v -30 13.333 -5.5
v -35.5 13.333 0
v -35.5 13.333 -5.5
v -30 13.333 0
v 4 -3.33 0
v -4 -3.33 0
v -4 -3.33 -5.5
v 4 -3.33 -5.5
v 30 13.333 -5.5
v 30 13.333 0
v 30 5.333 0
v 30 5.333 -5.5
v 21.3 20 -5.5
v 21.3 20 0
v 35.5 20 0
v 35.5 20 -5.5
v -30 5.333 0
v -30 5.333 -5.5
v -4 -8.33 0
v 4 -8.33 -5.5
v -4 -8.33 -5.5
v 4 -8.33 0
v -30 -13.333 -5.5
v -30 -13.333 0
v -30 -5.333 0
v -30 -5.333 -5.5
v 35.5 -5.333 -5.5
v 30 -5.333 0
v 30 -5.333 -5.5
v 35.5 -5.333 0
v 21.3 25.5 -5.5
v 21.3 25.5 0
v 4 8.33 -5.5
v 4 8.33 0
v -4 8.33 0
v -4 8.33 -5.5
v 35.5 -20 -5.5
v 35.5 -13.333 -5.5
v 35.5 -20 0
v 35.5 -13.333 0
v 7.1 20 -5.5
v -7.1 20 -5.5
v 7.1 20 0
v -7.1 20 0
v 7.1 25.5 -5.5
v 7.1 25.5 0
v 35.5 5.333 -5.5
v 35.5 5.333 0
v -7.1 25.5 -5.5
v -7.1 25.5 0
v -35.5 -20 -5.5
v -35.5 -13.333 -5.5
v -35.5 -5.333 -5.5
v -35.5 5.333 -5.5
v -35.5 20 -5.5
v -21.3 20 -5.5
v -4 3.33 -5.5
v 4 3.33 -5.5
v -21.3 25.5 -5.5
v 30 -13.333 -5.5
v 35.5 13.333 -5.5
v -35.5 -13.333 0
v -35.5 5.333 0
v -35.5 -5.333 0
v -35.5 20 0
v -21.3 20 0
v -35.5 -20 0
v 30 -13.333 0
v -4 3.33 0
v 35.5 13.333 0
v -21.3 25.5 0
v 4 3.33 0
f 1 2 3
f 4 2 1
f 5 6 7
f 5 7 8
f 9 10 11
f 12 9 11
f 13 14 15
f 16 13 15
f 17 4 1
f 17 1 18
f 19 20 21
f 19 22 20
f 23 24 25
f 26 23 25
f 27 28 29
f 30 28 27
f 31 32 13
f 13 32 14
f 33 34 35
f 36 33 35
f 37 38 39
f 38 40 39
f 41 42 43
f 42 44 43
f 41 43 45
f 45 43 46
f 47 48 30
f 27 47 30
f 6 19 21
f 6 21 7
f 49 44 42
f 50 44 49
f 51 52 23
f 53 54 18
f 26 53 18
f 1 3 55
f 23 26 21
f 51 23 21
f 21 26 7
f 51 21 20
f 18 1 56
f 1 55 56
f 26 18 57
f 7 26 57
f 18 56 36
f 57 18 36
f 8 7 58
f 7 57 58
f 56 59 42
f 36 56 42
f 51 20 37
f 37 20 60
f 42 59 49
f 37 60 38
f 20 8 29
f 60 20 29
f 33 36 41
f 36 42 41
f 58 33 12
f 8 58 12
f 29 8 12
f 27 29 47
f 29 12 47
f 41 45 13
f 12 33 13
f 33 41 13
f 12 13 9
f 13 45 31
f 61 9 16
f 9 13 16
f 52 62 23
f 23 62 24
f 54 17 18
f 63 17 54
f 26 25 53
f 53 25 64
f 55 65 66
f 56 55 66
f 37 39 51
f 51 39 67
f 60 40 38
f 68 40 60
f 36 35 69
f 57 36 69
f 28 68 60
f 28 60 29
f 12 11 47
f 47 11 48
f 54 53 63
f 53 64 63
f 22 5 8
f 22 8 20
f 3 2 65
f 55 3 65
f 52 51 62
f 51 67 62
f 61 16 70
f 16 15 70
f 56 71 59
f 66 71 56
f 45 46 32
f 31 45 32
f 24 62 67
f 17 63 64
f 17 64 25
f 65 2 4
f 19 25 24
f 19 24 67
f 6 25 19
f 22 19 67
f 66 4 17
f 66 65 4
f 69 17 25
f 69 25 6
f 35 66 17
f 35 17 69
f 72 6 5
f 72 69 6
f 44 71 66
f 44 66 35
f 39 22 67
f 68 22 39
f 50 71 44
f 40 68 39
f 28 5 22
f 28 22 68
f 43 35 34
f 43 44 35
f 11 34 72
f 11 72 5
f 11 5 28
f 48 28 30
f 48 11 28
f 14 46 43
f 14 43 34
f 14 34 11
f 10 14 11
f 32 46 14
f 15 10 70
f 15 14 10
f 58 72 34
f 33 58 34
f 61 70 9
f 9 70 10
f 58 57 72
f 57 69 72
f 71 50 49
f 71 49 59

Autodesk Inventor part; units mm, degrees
ref_plane "YZ Plane" through (0, 0, 0) normal (1, 0, 0) x (0, 1, 0)
ref_plane "XZ Plane" through (0, 0, 0) normal (0, 1, 0) x (-1, 0, 0)
ref_plane "XY Plane" through (0, 0, 0) normal (0, 0, 1) x (1, 0, 0)
sketch "Block1" plane through (0, 0, 0) normal (0, 0, 1) x (1, 0, 0)
  line L0 (-23.62, 29.22) -> (-7.58, 29.22)
  line L1 (-7.58, 29.22) -> (-7.58, 20.22)
  line L2 (-7.58, 20.22) -> (7.58, 20.22)
  line L3 (7.58, 20.22) -> (7.58, 29.22)
  line L4 (7.58, 29.22) -> (23.62, 29.22)
  line L5 (23.62, 29.22) -> (23.62, 20.22)
  line L6 (23.62, 20.22) -> (39.22, 20.22)
  line L7 (39.22, 20.22) -> (39.22, 13.1133)
  line L8 (39.22, 13.1133) -> (30.22, 13.1133)
  line L9 (30.22, 13.1133) -> (30.22, 5.5533)
  line L10 (30.22, 5.5533) -> (39.22, 5.5533)
  line L11 (39.22, 5.5533) -> (39.22, -5.5533)
  line L12 (39.22, -5.5533) -> (30.22, -5.5533)
  line L13 (30.22, -5.5533) -> (30.22, -13.1133)
  line L14 (30.22, -13.1133) -> (39.22, -13.1133)
  line L15 (39.22, -13.1133) -> (39.22, -20.22)
  line L16 (39.22, -20.22) -> (-39.22, -20.22)
  line L17 (-39.22, -20.22) -> (-39.22, -13.1133)
  line L18 (-39.22, -13.1133) -> (-30.22, -13.1133)
  line L19 (-30.22, -13.1133) -> (-30.22, -5.5533)
  line L20 (-30.22, -5.5533) -> (-39.22, -5.5533)
  line L21 (-39.22, -5.5533) -> (-39.22, 5.5533)
  line L22 (-39.22, 5.5533) -> (-30.22, 5.5533)
  line L23 (-30.22, 5.5533) -> (-30.22, 13.1133)
  line L24 (-30.22, 13.1133) -> (-39.22, 13.1133)
  line L25 (-39.22, 13.1133) -> (-39.22, 20.22)
  line L26 (-39.22, 20.22) -> (-23.62, 20.22)
  line L27 (-23.62, 20.22) -> (-23.62, 29.22)
  line L28 (4.22, 8.55) -> (4.22, 3.11)
  line L29 (4.22, 3.11) -> (-4.22, 3.11)
  line L30 (-4.22, 3.11) -> (-4.22, 8.55)
  line L31 (-4.22, 8.55) -> (4.22, 8.55)
  line L32 (4.22, -3.11) -> (4.22, -8.55)
  line L33 (4.22, -8.55) -> (-4.22, -8.55)
  line L34 (-4.22, -8.55) -> (-4.22, -3.11)
  line L35 (-4.22, -3.11) -> (4.22, -3.11)
  point P0 (0, 5.4933)
sketch "Block2" plane through (0, 0, 0) normal (0, 0, 1) x (1, 0, 0)
  line L0 (-23.5, 29.1) -> (-7.7, 29.1)
  line L1 (-7.7, 29.1) -> (-7.7, 20.1)
  line L2 (-7.7, 20.1) -> (7.7, 20.1)
  line L3 (7.7, 20.1) -> (7.7, 29.1)
  line L4 (7.7, 29.1) -> (23.5, 29.1)
  line L5 (23.5, 29.1) -> (23.5, 20.1)
  line L6 (23.5, 20.1) -> (39.1, 20.1)
  line L7 (39.1, 20.1) -> (39.1, 13.2333)
  line L8 (39.1, 13.2333) -> (30.1, 13.2333)
  line L9 (30.1, 13.2333) -> (30.1, 5.4333)
  line L10 (30.1, 5.4333) -> (39.1, 5.4333)
  line L11 (39.1, 5.4333) -> (39.1, -5.4333)
  line L12 (39.1, -5.4333) -> (30.1, -5.4333)
  line L13 (30.1, -5.4333) -> (30.1, -13.2333)
  line L14 (30.1, -13.2333) -> (39.1, -13.2333)
  line L15 (39.1, -13.2333) -> (39.1, -20.1)
  line L16 (39.1, -20.1) -> (-39.1, -20.1)
  line L17 (-39.1, -20.1) -> (-39.1, -13.2333)
  line L18 (-39.1, -13.2333) -> (-30.1, -13.2333)
  line L19 (-30.1, -13.2333) -> (-30.1, -5.4333)
  line L20 (-30.1, -5.4333) -> (-39.1, -5.4333)
  line L21 (-39.1, -5.4333) -> (-39.1, 5.4333)
  line L22 (-39.1, 5.4333) -> (-30.1, 5.4333)
  line L23 (-30.1, 5.4333) -> (-30.1, 13.2333)
  line L24 (-30.1, 13.2333) -> (-39.1, 13.2333)
  line L25 (-39.1, 13.2333) -> (-39.1, 20.1)
  line L26 (-39.1, 20.1) -> (-23.5, 20.1)
  line L27 (-23.5, 20.1) -> (-23.5, 29.1)
  line L28 (4.1, 8.43) -> (4.1, 3.23)
  line L29 (4.1, 3.23) -> (-4.1, 3.23)
  line L30 (-4.1, 3.23) -> (-4.1, 8.43)
  line L31 (-4.1, 8.43) -> (4.1, 8.43)
  line L32 (4.1, -3.23) -> (4.1, -8.43)
  line L33 (4.1, -8.43) -> (-4.1, -8.43)
  line L34 (-4.1, -8.43) -> (-4.1, -3.23)
  line L35 (-4.1, -3.23) -> (4.1, -3.23)
  point P0 (0, 5.4667)
sketch "Block3" plane through (0, 0, 0) normal (0, 0, 1) x (1, 0, 0)
  line L0 (7.6, 29.2) -> (23.6, 29.2)
  line L1 (23.6, 29.2) -> (23.6, 20.2)
  line L2 (23.6, 20.2) -> (39.2, 20.2)
  line L3 (39.2, 20.2) -> (39.2, 13.1333)
  line L4 (39.2, 13.1333) -> (30.2, 13.1333)
  line L5 (30.2, 13.1333) -> (30.2, 5.5333)
  line L6 (30.2, 5.5333) -> (39.2, 5.5333)
  line L7 (39.2, 5.5333) -> (39.2, -5.5333)
  line L8 (39.2, -5.5333) -> (30.2, -5.5333)
  line L9 (30.2, -5.5333) -> (30.2, -13.1333)
  line L10 (30.2, -13.1333) -> (39.2, -13.1333)
  line L11 (39.2, -13.1333) -> (39.2, -20.2)
  line L12 (39.2, -20.2) -> (-39.2, -20.2)
  line L13 (-39.2, -20.2) -> (-39.2, -13.1333)
  line L14 (-39.2, -13.1333) -> (-30.2, -13.1333)
  line L15 (-30.2, -13.1333) -> (-30.2, -5.5333)
  line L16 (-30.2, -5.5333) -> (-39.2, -5.5333)
  line L17 (-39.2, -5.5333) -> (-39.2, 5.5333)
  line L18 (-39.2, 5.5333) -> (-30.2, 5.5333)
  line L19 (-30.2, 5.5333) -> (-30.2, 13.1333)
  line L20 (-30.2, 13.1333) -> (-39.2, 13.1333)
  line L21 (-39.2, 13.1333) -> (-39.2, 20.2)
  line L22 (-39.2, 20.2) -> (-23.6, 20.2)
  line L23 (-23.6, 20.2) -> (-23.6, 29.2)
  line L24 (-23.6, 29.2) -> (-7.6, 29.2)
  line L25 (-7.6, 29.2) -> (-7.6, 20.2)
  line L26 (-7.6, 20.2) -> (7.6, 20.2)
  line L27 (7.6, 20.2) -> (7.6, 29.2)
  line L28 (4.2, 8.53) -> (4.2, 3.13)
  line L29 (4.2, 3.13) -> (-4.2, 3.13)
  line L30 (-4.2, 3.13) -> (-4.2, 8.53)
  line L31 (-4.2, 8.53) -> (4.2, 8.53)
  line L32 (4.2, -3.13) -> (4.2, -8.53)
  line L33 (4.2, -8.53) -> (-4.2, -8.53)
  line L34 (-4.2, -8.53) -> (-4.2, -3.13)
  line L35 (-4.2, -3.13) -> (4.2, -3.13)
  point P0 (0, 5.4889)
sketch "Block4" plane through (0, 0, 0) normal (0, 0, 1) x (1, 0, 0)
  line L0 (7.7, 29.1) -> (23.5, 29.1)
  line L1 (23.5, 29.1) -> (23.5, 20.1)
  line L2 (23.5, 20.1) -> (39.1, 20.1)
  line L3 (39.1, 20.1) -> (39.1, 13.2333)
  line L4 (39.1, 13.2333) -> (30.1, 13.2333)
  line L5 (30.1, 13.2333) -> (30.1, 5.4333)
  line L6 (30.1, 5.4333) -> (39.1, 5.4333)
  line L7 (39.1, 5.4333) -> (39.1, -5.4333)
  line L8 (39.1, -5.4333) -> (30.1, -5.4333)
  line L9 (30.1, -5.4333) -> (30.1, -13.2333)
  line L10 (30.1, -13.2333) -> (39.1, -13.2333)
  line L11 (39.1, -13.2333) -> (39.1, -20.1)
  line L12 (39.1, -20.1) -> (-39.1, -20.1)
  line L13 (-39.1, -20.1) -> (-39.1, -13.2333)
  line L14 (-39.1, -13.2333) -> (-30.1, -13.2333)
  line L15 (-30.1, -13.2333) -> (-30.1, -5.4333)
  line L16 (-30.1, -5.4333) -> (-39.1, -5.4333)
  line L17 (-39.1, -5.4333) -> (-39.1, 5.4333)
  line L18 (-39.1, 5.4333) -> (-30.1, 5.4333)
  line L19 (-30.1, 5.4333) -> (-30.1, 13.2333)
  line L20 (-30.1, 13.2333) -> (-39.1, 13.2333)
  line L21 (-39.1, 13.2333) -> (-39.1, 20.1)
  line L22 (-39.1, 20.1) -> (-23.5, 20.1)
  line L23 (-23.5, 20.1) -> (-23.5, 29.1)
  line L24 (-23.5, 29.1) -> (-7.7, 29.1)
  line L25 (-7.7, 29.1) -> (-7.7, 20.1)
  line L26 (-7.7, 20.1) -> (7.7, 20.1)
  line L27 (7.7, 20.1) -> (7.7, 29.1)
  line L28 (4.1, 8.43) -> (4.1, 3.23)
  line L29 (4.1, 3.23) -> (-4.1, 3.23)
  line L30 (-4.1, 3.23) -> (-4.1, 8.43)
  line L31 (-4.1, 8.43) -> (4.1, 8.43)
  line L32 (4.1, -3.23) -> (4.1, -8.43)
  line L33 (4.1, -8.43) -> (-4.1, -8.43)
  line L34 (-4.1, -8.43) -> (-4.1, -3.23)
  line L35 (-4.1, -3.23) -> (4.1, -3.23)
  point P0 (0, 5.4667)
sketch "Block5" plane through (0, 0, 0) normal (0, 0, 1) x (1, 0, 0)
  line L0 (-21.38, 25.58) -> (-7.02, 25.58)
  line L1 (-7.02, 25.58) -> (-7.02, 20.08)
  line L2 (-7.02, 20.08) -> (7.02, 20.08)
  line L3 (7.02, 20.08) -> (7.02, 25.58)
  line L4 (7.02, 25.58) -> (21.38, 25.58)
  line L5 (21.38, 25.58) -> (21.38, 20.08)
  line L6 (21.38, 20.08) -> (35.58, 20.08)
  line L7 (35.58, 20.08) -> (35.58, 13.2533)
  line L8 (35.58, 13.2533) -> (30.08, 13.2533)
  line L9 (30.08, 13.2533) -> (30.08, 5.4133)
  line L10 (30.08, 5.4133) -> (35.58, 5.4133)
  line L11 (35.58, 5.4133) -> (35.58, -5.4133)
  line L12 (35.58, -5.4133) -> (30.08, -5.4133)
  line L13 (30.08, -5.4133) -> (30.08, -13.2533)
  line L14 (30.08, -13.2533) -> (35.58, -13.2533)
  line L15 (35.58, -13.2533) -> (35.58, -20.08)
  line L16 (35.58, -20.08) -> (-35.58, -20.08)
  line L17 (-35.58, -20.08) -> (-35.58, -13.2533)
  line L18 (-35.58, -13.2533) -> (-30.08, -13.2533)
  line L19 (-30.08, -13.2533) -> (-30.08, -5.4133)
  line L20 (-30.08, -5.4133) -> (-35.58, -5.4133)
  line L21 (-35.58, -5.4133) -> (-35.58, 5.4133)
  line L22 (-35.58, 5.4133) -> (-30.08, 5.4133)
  line L23 (-30.08, 5.4133) -> (-30.08, 13.2533)
  line L24 (-30.08, 13.2533) -> (-35.58, 13.2533)
  line L25 (-35.58, 13.2533) -> (-35.58, 20.08)
  line L26 (-35.58, 20.08) -> (-21.38, 20.08)
  line L27 (-21.38, 20.08) -> (-21.38, 25.58)
  line L28 (4.08, 8.41) -> (4.08, 3.25)
  line L29 (4.08, 3.25) -> (-4.08, 3.25)
  line L30 (-4.08, 3.25) -> (-4.08, 8.41)
  line L31 (-4.08, 8.41) -> (4.08, 8.41)
  line L32 (4.08, -3.25) -> (4.08, -8.41)
  line L33 (4.08, -8.41) -> (-4.08, -8.41)
  line L34 (-4.08, -8.41) -> (-4.08, -3.25)
  line L35 (-4.08, -3.25) -> (4.08, -3.25)
  point P0 (0, 5.0733)
sketch "Sketch1" plane through (0, 0, 0) normal (0, 0, 1) x (1, 0, 0)
  line L0 (35.5, -20) -> (-35.5, -20)
  line L1 (-35.5, -20) -> (-35.5, 20)
  line L2 (-35.5, 20) -> (35.5, 20)
  line L3 (35.5, 20) -> (35.5, -20)
  line L4 (35.5, -20) -> (-35.5, 20) construction
  line L5 (-35.5, -20) -> (35.5, 20) construction
  point P0 (0, 0)
  point P1 (0, 0)
  dimension "d0" = 71
  dimension "d1" = 40
extrude "Extrusion1" add sketch "Sketch1" against normal blind 5.5
sketch "Sketch3" plane through (0, 0, 0) normal (0, 0, 1) x (1, 0, 0)
  line L0 (-35.5, 20) -> (35.5, 20) projected
  line L1 (-35.5, -20) -> (-35.5, 20) projected
  line L2 (-35.5, 13.3333) -> (-30, 13.3333)
  line L3 (-30, 13.3333) -> (-30, 5.3333)
  line L4 (-30, 5.3333) -> (-35.5, 5.3333)
  line L5 (-35.5, 13.3333) -> (-35.5, 5.3333)
  line L6 (-161.1974, 0) -> (72.4829, 0) projected
  line L7 (0, -29.94) -> (0, 38.94) projected
  line L8 (35.5, 13.3333) -> (30, 13.3333)
  line L9 (30, 13.3333) -> (30, 5.3333)
  line L10 (30, 5.3333) -> (35.5, 5.3333)
  line L11 (35.5, 13.3333) -> (35.5, 5.3333)
  line L12 (-35.5, -13.3333) -> (-30, -13.3333)
  line L13 (-30, -13.3333) -> (-30, -5.3333)
  line L14 (-30, -5.3333) -> (-35.5, -5.3333)
  line L15 (-35.5, -13.3333) -> (-35.5, -5.3333)
  line L16 (30, -13.3333) -> (30, -5.3333)
  line L17 (35.5, -13.3333) -> (35.5, -5.3333)
  line L18 (30, -5.3333) -> (35.5, -5.3333)
  line L19 (35.5, -13.3333) -> (30, -13.3333)
  point P0 (0, 0)
  dimension "d16" = 5.5
  dimension "d17" = 8
  dimension "d18" = 6.6667
sketch "Sketch4" plane through (0, 0, 0) normal (0, 0, 1) x (1, 0, 0)
  line L0 (4, -8.33) -> (-4, -8.33)
  line L1 (-4, -8.33) -> (-4, -3.33)
  line L2 (-4, -3.33) -> (4, -3.33)
  line L3 (4, -3.33) -> (4, -8.33)
  line L4 (4, -8.33) -> (-4, -3.33) construction
  line L5 (-4, -8.33) -> (4, -3.33) construction
  line L6 (-161.1974, 0) -> (72.4829, 0) projected
  line L7 (4, 8.33) -> (-4, 8.33)
  line L8 (-4, 8.33) -> (-4, 3.33)
  line L9 (-4, 3.33) -> (4, 3.33)
  line L10 (4, 3.33) -> (4, 8.33)
  line L11 (4, 8.33) -> (-4, 3.33) construction
  line L12 (-4, 8.33) -> (4, 3.33) construction
  point P0 (0, -5.83)
  point P1 (0, 5.83)
  dimension "d25" = 8
  dimension "d26" = 5
  dimension "d27" = 3.33
extrude "Extrusion4" cut sketch "Sketch4" against normal through all
extrude "Extrusion5" cut sketch "Sketch3" against normal through all contours L14 L13 L12 L1 | L2 L3 L4 L1 | L11 L10 L9 L8 | L16 L18 L17 L19
sketch "Sketch5" plane through (0, 0, 0) normal (0, 0, 1) x (1, 0, 0)
  line L0 (-35.5, 20) -> (35.5, 20) projected
  line L1 (-21.3, 20) -> (-7.1, 20)
  line L2 (-7.1, 20) -> (-7.1, 25.5)
  line L3 (-7.1, 25.5) -> (-21.3, 25.5)
  line L4 (-21.3, 25.5) -> (-21.3, 20)
  line L5 (0, -29.94) -> (0, 38.94) projected
  line L6 (21.3, 20) -> (7.1, 20)
  line L7 (7.1, 20) -> (7.1, 25.5)
  line L8 (7.1, 25.5) -> (21.3, 25.5)
  line L9 (21.3, 25.5) -> (21.3, 20)
  point P0 (0, 0)
  dimension "d32" = 14.2
  dimension "d33" = 14.2
  dimension "d34" = 5.5
extrude "Extrusion6" add sketch "Sketch5" against normal blind 5.5
equation "\"d2\" = Wt"
equation "\"d16\" = Wt"
equation "\"d17\" = 0.2 * d1"
equation "\"d18\" = 0.166667 * d1"
equation "\"d32\" = 0.2 * d0"
equation "\"d33\" = 0.2 * d0"
equation "\"d34\" = Wt"
equation "\"d35\" = Wt"
equation "\"testKerf1\" = 1"
equation "\"Wt\" = 5.5"
properties part number "drive_support_side" material "Wood (Birch)"
